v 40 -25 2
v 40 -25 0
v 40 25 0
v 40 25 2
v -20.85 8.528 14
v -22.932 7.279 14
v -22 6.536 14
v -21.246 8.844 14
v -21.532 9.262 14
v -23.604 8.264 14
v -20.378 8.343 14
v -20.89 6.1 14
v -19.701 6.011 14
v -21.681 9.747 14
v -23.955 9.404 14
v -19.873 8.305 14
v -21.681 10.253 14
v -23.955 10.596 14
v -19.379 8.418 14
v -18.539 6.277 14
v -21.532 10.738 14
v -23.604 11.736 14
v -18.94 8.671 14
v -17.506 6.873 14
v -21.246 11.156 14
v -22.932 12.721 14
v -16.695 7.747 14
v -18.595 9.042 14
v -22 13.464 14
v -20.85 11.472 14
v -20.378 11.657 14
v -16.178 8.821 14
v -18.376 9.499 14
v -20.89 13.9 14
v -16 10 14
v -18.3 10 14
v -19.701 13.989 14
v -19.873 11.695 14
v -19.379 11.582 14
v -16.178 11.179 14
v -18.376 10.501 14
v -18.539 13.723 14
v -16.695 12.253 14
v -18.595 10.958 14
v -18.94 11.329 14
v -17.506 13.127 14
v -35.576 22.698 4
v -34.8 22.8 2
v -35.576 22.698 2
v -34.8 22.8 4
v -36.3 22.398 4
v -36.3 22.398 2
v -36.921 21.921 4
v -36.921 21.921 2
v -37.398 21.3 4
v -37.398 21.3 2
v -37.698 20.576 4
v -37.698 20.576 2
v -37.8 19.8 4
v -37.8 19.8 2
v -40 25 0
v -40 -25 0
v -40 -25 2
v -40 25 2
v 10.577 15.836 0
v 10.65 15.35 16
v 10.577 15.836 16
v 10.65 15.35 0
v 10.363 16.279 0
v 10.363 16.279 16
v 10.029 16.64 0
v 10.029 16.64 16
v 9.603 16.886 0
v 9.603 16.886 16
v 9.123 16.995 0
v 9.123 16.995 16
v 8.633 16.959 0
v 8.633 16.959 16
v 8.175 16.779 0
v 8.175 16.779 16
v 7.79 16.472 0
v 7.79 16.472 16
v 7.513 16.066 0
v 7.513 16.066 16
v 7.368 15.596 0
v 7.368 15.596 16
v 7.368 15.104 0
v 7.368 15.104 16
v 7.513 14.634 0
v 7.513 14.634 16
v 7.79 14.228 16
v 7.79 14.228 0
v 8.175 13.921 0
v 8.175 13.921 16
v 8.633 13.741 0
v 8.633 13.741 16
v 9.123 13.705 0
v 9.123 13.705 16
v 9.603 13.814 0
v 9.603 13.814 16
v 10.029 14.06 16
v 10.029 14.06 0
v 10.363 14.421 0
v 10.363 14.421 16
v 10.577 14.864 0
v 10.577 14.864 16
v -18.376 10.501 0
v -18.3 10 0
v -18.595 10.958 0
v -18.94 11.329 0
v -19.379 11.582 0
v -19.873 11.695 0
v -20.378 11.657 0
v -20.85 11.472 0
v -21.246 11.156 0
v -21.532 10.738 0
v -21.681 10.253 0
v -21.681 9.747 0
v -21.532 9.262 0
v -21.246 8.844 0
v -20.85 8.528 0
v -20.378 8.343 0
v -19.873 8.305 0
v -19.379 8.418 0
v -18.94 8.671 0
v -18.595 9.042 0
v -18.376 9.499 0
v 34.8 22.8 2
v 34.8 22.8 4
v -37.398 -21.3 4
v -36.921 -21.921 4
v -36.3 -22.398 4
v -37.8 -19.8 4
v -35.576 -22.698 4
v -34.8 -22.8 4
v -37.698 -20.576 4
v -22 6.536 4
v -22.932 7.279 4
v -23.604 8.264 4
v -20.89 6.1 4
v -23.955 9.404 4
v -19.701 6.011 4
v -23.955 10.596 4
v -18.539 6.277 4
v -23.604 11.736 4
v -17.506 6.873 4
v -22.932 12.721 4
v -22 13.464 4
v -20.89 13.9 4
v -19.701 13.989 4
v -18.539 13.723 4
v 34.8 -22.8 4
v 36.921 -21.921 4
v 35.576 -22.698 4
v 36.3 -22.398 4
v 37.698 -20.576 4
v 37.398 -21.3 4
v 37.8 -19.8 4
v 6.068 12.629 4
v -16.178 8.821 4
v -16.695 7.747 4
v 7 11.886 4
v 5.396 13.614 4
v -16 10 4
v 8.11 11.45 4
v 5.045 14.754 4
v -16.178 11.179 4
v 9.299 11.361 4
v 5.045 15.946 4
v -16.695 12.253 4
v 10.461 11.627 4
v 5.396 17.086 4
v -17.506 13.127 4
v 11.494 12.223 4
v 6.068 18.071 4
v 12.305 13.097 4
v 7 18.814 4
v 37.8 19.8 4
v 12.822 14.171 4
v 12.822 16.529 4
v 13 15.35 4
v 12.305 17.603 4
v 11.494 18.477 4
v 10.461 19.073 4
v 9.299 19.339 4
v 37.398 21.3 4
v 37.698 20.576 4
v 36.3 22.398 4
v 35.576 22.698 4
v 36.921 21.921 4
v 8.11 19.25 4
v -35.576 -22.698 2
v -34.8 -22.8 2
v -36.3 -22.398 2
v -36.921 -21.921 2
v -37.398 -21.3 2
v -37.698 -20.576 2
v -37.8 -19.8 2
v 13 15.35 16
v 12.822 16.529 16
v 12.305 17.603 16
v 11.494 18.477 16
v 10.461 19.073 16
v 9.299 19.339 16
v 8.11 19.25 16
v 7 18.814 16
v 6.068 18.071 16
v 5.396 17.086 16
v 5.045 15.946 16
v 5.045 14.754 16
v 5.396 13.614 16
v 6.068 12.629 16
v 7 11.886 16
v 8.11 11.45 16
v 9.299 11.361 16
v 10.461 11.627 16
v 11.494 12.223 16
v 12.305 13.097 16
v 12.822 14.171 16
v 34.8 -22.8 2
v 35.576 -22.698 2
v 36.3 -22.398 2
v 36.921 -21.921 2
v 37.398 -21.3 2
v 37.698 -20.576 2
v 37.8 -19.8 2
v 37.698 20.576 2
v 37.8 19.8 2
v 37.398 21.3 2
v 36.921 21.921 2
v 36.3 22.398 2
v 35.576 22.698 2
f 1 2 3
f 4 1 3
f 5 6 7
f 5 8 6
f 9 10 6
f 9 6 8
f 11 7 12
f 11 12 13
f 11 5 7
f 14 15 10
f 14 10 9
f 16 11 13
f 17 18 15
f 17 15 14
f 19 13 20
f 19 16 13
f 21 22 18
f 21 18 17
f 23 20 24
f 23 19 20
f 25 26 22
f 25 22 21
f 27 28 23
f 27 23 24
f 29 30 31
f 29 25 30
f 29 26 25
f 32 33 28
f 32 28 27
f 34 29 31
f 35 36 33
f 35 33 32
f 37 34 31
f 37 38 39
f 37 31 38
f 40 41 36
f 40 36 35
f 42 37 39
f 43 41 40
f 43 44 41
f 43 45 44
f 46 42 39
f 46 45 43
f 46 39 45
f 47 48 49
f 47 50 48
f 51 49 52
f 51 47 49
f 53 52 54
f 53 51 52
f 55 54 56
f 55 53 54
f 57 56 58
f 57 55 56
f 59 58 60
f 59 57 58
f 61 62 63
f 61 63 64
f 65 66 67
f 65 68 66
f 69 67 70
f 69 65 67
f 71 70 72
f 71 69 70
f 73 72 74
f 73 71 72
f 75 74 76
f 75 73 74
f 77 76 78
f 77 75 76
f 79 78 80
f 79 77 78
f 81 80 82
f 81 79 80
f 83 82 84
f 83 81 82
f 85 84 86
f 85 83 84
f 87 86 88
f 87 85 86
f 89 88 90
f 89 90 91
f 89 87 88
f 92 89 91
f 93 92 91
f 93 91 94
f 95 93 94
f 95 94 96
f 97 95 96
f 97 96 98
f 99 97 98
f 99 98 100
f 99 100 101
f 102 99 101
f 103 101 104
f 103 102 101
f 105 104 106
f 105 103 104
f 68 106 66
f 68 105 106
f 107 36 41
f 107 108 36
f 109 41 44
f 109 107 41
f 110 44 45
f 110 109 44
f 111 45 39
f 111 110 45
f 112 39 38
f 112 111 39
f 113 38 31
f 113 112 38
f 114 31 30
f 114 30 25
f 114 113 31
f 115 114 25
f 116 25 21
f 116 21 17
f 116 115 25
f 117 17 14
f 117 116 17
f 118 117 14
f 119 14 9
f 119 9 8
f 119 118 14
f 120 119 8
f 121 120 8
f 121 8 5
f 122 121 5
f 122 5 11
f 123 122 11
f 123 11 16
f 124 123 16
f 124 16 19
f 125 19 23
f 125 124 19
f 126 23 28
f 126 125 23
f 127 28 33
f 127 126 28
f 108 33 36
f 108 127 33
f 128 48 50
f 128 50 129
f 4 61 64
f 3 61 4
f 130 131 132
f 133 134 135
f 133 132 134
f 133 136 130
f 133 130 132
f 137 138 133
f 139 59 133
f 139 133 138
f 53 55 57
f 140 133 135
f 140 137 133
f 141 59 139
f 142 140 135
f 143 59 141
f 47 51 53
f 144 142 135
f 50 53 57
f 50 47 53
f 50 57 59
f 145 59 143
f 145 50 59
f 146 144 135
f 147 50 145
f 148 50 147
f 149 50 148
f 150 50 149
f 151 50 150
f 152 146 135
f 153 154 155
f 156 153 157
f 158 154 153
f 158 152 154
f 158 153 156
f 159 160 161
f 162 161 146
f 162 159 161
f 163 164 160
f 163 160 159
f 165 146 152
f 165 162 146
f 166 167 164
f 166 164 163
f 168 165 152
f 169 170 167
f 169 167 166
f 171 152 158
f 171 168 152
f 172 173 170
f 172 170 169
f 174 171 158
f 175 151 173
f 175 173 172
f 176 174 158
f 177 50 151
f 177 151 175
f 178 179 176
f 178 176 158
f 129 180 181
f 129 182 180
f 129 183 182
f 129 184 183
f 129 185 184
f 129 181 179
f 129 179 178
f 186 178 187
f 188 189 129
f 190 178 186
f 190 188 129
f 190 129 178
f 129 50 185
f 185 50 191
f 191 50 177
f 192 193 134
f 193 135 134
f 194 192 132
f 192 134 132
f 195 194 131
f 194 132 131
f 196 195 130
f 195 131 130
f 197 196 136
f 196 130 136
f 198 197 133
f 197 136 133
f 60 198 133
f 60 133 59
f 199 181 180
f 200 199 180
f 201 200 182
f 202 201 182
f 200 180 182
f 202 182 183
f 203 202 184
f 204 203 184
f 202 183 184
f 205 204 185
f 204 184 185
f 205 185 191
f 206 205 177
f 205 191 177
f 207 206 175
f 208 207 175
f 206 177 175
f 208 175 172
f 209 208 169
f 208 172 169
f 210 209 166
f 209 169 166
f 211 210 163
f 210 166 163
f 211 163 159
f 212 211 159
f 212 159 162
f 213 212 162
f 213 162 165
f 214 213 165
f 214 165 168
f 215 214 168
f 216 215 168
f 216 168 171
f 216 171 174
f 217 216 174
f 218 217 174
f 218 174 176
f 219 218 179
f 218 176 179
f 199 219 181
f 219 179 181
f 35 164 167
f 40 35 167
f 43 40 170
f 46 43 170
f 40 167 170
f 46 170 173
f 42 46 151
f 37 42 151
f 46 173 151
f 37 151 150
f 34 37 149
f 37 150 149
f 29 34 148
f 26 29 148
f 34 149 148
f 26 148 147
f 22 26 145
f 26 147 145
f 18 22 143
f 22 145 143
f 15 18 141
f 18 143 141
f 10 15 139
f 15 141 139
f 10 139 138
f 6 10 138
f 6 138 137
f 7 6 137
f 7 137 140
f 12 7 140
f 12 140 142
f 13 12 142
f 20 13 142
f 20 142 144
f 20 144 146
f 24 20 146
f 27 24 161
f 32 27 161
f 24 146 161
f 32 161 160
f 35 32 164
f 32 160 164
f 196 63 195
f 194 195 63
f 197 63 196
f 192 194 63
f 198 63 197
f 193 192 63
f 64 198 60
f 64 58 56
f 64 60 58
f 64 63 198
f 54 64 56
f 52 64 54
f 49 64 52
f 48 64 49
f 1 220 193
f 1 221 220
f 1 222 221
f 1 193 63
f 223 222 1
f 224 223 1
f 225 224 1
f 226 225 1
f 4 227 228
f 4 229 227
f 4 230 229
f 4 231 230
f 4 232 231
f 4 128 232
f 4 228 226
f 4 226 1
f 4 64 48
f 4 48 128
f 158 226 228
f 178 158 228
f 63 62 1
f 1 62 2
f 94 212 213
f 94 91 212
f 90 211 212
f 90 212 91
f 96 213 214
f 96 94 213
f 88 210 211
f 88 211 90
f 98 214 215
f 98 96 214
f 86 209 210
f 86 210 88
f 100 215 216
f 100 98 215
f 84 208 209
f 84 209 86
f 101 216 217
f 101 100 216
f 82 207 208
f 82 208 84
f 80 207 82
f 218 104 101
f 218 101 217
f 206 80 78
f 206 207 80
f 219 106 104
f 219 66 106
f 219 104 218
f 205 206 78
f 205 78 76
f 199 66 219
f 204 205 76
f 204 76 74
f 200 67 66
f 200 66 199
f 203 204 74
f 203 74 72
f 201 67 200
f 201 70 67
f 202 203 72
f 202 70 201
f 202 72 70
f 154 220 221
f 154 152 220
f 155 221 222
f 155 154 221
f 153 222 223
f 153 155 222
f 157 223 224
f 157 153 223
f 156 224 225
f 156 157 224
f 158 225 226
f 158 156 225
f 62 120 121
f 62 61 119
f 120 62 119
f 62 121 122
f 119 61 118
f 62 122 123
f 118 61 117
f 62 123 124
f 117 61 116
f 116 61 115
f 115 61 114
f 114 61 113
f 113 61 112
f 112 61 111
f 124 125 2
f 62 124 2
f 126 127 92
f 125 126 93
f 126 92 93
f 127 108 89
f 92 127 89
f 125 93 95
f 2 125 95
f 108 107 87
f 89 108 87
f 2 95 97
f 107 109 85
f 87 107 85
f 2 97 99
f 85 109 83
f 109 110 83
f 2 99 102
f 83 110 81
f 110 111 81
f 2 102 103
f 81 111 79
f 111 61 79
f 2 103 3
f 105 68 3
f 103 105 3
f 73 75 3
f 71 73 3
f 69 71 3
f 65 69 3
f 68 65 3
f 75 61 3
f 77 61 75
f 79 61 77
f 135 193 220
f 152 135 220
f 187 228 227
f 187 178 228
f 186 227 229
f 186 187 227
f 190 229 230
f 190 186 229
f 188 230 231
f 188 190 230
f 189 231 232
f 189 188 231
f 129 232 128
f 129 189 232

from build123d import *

# Parameters (mm, degrees)
F0_W      = 80
F0_H      = 50
F1_DEPTH  = 2
F2_W      = 75.6
F2_H      = 45.6
F3_DEPTH  = 2
F4_R      = 3
F5_R      = 1.7
F5_R_2    = 1.65
F6_DEPTH  = 25
F7_R      = 4
F7_R_2    = 1.65
F8_DEPTH  = 12
F9_R      = 4
F9_R_2    = 1.7
F10_DEPTH = 10


with BuildPart() as f1:
    # F0 (on Top) → F1 (new body)
    with BuildSketch(Plane.XY):
        Rectangle(F0_W, F0_H)
    extrude(amount=F1_DEPTH)

    # F2 (on face) → F3 (join)
    with BuildSketch(Plane.XY.offset(2)):
        Rectangle(F2_W, F2_H)
    extrude(amount=F3_DEPTH)

    # F4
    f4_edges = [f1.edges().sort_by_distance(p)[0] for p in [
        (-37.8, 22.8, 3),
        (-37.8, -22.8, 3),
        (37.8, 22.8, 3),
        (37.8, -22.8, 3),
    ]]
    fillet(f4_edges, radius=F4_R)

    # F5 (on face) → F6 (cut)
    with BuildSketch(Plane(origin=(0, 0, 0), x_dir=(1, 0, 0), z_dir=(0, 0, -1))):
        with Locations((-20, -10)):
            Circle(F5_R)
        with Locations((9, -15.35)):
            Circle(F5_R_2)
    extrude(amount=-F6_DEPTH, mode=Mode.SUBTRACT)

    # F7 (on face) → F8 (join)
    with BuildSketch(Plane.XY.offset(4)):
        with Locations((9, 15.35)):
            Circle(F7_R)
        with Locations((9, 15.35)):
            Circle(F7_R_2, mode=Mode.SUBTRACT)
    extrude(amount=F8_DEPTH)

    # F9 (on face) → F10 (join)
    with BuildSketch(Plane.XY.offset(4)):
        with Locations((-20, 10)):
            Circle(F9_R)
        with Locations((-20, 10)):
            Circle(F9_R_2, mode=Mode.SUBTRACT)
    extrude(amount=F10_DEPTH)


solid = f1.part
